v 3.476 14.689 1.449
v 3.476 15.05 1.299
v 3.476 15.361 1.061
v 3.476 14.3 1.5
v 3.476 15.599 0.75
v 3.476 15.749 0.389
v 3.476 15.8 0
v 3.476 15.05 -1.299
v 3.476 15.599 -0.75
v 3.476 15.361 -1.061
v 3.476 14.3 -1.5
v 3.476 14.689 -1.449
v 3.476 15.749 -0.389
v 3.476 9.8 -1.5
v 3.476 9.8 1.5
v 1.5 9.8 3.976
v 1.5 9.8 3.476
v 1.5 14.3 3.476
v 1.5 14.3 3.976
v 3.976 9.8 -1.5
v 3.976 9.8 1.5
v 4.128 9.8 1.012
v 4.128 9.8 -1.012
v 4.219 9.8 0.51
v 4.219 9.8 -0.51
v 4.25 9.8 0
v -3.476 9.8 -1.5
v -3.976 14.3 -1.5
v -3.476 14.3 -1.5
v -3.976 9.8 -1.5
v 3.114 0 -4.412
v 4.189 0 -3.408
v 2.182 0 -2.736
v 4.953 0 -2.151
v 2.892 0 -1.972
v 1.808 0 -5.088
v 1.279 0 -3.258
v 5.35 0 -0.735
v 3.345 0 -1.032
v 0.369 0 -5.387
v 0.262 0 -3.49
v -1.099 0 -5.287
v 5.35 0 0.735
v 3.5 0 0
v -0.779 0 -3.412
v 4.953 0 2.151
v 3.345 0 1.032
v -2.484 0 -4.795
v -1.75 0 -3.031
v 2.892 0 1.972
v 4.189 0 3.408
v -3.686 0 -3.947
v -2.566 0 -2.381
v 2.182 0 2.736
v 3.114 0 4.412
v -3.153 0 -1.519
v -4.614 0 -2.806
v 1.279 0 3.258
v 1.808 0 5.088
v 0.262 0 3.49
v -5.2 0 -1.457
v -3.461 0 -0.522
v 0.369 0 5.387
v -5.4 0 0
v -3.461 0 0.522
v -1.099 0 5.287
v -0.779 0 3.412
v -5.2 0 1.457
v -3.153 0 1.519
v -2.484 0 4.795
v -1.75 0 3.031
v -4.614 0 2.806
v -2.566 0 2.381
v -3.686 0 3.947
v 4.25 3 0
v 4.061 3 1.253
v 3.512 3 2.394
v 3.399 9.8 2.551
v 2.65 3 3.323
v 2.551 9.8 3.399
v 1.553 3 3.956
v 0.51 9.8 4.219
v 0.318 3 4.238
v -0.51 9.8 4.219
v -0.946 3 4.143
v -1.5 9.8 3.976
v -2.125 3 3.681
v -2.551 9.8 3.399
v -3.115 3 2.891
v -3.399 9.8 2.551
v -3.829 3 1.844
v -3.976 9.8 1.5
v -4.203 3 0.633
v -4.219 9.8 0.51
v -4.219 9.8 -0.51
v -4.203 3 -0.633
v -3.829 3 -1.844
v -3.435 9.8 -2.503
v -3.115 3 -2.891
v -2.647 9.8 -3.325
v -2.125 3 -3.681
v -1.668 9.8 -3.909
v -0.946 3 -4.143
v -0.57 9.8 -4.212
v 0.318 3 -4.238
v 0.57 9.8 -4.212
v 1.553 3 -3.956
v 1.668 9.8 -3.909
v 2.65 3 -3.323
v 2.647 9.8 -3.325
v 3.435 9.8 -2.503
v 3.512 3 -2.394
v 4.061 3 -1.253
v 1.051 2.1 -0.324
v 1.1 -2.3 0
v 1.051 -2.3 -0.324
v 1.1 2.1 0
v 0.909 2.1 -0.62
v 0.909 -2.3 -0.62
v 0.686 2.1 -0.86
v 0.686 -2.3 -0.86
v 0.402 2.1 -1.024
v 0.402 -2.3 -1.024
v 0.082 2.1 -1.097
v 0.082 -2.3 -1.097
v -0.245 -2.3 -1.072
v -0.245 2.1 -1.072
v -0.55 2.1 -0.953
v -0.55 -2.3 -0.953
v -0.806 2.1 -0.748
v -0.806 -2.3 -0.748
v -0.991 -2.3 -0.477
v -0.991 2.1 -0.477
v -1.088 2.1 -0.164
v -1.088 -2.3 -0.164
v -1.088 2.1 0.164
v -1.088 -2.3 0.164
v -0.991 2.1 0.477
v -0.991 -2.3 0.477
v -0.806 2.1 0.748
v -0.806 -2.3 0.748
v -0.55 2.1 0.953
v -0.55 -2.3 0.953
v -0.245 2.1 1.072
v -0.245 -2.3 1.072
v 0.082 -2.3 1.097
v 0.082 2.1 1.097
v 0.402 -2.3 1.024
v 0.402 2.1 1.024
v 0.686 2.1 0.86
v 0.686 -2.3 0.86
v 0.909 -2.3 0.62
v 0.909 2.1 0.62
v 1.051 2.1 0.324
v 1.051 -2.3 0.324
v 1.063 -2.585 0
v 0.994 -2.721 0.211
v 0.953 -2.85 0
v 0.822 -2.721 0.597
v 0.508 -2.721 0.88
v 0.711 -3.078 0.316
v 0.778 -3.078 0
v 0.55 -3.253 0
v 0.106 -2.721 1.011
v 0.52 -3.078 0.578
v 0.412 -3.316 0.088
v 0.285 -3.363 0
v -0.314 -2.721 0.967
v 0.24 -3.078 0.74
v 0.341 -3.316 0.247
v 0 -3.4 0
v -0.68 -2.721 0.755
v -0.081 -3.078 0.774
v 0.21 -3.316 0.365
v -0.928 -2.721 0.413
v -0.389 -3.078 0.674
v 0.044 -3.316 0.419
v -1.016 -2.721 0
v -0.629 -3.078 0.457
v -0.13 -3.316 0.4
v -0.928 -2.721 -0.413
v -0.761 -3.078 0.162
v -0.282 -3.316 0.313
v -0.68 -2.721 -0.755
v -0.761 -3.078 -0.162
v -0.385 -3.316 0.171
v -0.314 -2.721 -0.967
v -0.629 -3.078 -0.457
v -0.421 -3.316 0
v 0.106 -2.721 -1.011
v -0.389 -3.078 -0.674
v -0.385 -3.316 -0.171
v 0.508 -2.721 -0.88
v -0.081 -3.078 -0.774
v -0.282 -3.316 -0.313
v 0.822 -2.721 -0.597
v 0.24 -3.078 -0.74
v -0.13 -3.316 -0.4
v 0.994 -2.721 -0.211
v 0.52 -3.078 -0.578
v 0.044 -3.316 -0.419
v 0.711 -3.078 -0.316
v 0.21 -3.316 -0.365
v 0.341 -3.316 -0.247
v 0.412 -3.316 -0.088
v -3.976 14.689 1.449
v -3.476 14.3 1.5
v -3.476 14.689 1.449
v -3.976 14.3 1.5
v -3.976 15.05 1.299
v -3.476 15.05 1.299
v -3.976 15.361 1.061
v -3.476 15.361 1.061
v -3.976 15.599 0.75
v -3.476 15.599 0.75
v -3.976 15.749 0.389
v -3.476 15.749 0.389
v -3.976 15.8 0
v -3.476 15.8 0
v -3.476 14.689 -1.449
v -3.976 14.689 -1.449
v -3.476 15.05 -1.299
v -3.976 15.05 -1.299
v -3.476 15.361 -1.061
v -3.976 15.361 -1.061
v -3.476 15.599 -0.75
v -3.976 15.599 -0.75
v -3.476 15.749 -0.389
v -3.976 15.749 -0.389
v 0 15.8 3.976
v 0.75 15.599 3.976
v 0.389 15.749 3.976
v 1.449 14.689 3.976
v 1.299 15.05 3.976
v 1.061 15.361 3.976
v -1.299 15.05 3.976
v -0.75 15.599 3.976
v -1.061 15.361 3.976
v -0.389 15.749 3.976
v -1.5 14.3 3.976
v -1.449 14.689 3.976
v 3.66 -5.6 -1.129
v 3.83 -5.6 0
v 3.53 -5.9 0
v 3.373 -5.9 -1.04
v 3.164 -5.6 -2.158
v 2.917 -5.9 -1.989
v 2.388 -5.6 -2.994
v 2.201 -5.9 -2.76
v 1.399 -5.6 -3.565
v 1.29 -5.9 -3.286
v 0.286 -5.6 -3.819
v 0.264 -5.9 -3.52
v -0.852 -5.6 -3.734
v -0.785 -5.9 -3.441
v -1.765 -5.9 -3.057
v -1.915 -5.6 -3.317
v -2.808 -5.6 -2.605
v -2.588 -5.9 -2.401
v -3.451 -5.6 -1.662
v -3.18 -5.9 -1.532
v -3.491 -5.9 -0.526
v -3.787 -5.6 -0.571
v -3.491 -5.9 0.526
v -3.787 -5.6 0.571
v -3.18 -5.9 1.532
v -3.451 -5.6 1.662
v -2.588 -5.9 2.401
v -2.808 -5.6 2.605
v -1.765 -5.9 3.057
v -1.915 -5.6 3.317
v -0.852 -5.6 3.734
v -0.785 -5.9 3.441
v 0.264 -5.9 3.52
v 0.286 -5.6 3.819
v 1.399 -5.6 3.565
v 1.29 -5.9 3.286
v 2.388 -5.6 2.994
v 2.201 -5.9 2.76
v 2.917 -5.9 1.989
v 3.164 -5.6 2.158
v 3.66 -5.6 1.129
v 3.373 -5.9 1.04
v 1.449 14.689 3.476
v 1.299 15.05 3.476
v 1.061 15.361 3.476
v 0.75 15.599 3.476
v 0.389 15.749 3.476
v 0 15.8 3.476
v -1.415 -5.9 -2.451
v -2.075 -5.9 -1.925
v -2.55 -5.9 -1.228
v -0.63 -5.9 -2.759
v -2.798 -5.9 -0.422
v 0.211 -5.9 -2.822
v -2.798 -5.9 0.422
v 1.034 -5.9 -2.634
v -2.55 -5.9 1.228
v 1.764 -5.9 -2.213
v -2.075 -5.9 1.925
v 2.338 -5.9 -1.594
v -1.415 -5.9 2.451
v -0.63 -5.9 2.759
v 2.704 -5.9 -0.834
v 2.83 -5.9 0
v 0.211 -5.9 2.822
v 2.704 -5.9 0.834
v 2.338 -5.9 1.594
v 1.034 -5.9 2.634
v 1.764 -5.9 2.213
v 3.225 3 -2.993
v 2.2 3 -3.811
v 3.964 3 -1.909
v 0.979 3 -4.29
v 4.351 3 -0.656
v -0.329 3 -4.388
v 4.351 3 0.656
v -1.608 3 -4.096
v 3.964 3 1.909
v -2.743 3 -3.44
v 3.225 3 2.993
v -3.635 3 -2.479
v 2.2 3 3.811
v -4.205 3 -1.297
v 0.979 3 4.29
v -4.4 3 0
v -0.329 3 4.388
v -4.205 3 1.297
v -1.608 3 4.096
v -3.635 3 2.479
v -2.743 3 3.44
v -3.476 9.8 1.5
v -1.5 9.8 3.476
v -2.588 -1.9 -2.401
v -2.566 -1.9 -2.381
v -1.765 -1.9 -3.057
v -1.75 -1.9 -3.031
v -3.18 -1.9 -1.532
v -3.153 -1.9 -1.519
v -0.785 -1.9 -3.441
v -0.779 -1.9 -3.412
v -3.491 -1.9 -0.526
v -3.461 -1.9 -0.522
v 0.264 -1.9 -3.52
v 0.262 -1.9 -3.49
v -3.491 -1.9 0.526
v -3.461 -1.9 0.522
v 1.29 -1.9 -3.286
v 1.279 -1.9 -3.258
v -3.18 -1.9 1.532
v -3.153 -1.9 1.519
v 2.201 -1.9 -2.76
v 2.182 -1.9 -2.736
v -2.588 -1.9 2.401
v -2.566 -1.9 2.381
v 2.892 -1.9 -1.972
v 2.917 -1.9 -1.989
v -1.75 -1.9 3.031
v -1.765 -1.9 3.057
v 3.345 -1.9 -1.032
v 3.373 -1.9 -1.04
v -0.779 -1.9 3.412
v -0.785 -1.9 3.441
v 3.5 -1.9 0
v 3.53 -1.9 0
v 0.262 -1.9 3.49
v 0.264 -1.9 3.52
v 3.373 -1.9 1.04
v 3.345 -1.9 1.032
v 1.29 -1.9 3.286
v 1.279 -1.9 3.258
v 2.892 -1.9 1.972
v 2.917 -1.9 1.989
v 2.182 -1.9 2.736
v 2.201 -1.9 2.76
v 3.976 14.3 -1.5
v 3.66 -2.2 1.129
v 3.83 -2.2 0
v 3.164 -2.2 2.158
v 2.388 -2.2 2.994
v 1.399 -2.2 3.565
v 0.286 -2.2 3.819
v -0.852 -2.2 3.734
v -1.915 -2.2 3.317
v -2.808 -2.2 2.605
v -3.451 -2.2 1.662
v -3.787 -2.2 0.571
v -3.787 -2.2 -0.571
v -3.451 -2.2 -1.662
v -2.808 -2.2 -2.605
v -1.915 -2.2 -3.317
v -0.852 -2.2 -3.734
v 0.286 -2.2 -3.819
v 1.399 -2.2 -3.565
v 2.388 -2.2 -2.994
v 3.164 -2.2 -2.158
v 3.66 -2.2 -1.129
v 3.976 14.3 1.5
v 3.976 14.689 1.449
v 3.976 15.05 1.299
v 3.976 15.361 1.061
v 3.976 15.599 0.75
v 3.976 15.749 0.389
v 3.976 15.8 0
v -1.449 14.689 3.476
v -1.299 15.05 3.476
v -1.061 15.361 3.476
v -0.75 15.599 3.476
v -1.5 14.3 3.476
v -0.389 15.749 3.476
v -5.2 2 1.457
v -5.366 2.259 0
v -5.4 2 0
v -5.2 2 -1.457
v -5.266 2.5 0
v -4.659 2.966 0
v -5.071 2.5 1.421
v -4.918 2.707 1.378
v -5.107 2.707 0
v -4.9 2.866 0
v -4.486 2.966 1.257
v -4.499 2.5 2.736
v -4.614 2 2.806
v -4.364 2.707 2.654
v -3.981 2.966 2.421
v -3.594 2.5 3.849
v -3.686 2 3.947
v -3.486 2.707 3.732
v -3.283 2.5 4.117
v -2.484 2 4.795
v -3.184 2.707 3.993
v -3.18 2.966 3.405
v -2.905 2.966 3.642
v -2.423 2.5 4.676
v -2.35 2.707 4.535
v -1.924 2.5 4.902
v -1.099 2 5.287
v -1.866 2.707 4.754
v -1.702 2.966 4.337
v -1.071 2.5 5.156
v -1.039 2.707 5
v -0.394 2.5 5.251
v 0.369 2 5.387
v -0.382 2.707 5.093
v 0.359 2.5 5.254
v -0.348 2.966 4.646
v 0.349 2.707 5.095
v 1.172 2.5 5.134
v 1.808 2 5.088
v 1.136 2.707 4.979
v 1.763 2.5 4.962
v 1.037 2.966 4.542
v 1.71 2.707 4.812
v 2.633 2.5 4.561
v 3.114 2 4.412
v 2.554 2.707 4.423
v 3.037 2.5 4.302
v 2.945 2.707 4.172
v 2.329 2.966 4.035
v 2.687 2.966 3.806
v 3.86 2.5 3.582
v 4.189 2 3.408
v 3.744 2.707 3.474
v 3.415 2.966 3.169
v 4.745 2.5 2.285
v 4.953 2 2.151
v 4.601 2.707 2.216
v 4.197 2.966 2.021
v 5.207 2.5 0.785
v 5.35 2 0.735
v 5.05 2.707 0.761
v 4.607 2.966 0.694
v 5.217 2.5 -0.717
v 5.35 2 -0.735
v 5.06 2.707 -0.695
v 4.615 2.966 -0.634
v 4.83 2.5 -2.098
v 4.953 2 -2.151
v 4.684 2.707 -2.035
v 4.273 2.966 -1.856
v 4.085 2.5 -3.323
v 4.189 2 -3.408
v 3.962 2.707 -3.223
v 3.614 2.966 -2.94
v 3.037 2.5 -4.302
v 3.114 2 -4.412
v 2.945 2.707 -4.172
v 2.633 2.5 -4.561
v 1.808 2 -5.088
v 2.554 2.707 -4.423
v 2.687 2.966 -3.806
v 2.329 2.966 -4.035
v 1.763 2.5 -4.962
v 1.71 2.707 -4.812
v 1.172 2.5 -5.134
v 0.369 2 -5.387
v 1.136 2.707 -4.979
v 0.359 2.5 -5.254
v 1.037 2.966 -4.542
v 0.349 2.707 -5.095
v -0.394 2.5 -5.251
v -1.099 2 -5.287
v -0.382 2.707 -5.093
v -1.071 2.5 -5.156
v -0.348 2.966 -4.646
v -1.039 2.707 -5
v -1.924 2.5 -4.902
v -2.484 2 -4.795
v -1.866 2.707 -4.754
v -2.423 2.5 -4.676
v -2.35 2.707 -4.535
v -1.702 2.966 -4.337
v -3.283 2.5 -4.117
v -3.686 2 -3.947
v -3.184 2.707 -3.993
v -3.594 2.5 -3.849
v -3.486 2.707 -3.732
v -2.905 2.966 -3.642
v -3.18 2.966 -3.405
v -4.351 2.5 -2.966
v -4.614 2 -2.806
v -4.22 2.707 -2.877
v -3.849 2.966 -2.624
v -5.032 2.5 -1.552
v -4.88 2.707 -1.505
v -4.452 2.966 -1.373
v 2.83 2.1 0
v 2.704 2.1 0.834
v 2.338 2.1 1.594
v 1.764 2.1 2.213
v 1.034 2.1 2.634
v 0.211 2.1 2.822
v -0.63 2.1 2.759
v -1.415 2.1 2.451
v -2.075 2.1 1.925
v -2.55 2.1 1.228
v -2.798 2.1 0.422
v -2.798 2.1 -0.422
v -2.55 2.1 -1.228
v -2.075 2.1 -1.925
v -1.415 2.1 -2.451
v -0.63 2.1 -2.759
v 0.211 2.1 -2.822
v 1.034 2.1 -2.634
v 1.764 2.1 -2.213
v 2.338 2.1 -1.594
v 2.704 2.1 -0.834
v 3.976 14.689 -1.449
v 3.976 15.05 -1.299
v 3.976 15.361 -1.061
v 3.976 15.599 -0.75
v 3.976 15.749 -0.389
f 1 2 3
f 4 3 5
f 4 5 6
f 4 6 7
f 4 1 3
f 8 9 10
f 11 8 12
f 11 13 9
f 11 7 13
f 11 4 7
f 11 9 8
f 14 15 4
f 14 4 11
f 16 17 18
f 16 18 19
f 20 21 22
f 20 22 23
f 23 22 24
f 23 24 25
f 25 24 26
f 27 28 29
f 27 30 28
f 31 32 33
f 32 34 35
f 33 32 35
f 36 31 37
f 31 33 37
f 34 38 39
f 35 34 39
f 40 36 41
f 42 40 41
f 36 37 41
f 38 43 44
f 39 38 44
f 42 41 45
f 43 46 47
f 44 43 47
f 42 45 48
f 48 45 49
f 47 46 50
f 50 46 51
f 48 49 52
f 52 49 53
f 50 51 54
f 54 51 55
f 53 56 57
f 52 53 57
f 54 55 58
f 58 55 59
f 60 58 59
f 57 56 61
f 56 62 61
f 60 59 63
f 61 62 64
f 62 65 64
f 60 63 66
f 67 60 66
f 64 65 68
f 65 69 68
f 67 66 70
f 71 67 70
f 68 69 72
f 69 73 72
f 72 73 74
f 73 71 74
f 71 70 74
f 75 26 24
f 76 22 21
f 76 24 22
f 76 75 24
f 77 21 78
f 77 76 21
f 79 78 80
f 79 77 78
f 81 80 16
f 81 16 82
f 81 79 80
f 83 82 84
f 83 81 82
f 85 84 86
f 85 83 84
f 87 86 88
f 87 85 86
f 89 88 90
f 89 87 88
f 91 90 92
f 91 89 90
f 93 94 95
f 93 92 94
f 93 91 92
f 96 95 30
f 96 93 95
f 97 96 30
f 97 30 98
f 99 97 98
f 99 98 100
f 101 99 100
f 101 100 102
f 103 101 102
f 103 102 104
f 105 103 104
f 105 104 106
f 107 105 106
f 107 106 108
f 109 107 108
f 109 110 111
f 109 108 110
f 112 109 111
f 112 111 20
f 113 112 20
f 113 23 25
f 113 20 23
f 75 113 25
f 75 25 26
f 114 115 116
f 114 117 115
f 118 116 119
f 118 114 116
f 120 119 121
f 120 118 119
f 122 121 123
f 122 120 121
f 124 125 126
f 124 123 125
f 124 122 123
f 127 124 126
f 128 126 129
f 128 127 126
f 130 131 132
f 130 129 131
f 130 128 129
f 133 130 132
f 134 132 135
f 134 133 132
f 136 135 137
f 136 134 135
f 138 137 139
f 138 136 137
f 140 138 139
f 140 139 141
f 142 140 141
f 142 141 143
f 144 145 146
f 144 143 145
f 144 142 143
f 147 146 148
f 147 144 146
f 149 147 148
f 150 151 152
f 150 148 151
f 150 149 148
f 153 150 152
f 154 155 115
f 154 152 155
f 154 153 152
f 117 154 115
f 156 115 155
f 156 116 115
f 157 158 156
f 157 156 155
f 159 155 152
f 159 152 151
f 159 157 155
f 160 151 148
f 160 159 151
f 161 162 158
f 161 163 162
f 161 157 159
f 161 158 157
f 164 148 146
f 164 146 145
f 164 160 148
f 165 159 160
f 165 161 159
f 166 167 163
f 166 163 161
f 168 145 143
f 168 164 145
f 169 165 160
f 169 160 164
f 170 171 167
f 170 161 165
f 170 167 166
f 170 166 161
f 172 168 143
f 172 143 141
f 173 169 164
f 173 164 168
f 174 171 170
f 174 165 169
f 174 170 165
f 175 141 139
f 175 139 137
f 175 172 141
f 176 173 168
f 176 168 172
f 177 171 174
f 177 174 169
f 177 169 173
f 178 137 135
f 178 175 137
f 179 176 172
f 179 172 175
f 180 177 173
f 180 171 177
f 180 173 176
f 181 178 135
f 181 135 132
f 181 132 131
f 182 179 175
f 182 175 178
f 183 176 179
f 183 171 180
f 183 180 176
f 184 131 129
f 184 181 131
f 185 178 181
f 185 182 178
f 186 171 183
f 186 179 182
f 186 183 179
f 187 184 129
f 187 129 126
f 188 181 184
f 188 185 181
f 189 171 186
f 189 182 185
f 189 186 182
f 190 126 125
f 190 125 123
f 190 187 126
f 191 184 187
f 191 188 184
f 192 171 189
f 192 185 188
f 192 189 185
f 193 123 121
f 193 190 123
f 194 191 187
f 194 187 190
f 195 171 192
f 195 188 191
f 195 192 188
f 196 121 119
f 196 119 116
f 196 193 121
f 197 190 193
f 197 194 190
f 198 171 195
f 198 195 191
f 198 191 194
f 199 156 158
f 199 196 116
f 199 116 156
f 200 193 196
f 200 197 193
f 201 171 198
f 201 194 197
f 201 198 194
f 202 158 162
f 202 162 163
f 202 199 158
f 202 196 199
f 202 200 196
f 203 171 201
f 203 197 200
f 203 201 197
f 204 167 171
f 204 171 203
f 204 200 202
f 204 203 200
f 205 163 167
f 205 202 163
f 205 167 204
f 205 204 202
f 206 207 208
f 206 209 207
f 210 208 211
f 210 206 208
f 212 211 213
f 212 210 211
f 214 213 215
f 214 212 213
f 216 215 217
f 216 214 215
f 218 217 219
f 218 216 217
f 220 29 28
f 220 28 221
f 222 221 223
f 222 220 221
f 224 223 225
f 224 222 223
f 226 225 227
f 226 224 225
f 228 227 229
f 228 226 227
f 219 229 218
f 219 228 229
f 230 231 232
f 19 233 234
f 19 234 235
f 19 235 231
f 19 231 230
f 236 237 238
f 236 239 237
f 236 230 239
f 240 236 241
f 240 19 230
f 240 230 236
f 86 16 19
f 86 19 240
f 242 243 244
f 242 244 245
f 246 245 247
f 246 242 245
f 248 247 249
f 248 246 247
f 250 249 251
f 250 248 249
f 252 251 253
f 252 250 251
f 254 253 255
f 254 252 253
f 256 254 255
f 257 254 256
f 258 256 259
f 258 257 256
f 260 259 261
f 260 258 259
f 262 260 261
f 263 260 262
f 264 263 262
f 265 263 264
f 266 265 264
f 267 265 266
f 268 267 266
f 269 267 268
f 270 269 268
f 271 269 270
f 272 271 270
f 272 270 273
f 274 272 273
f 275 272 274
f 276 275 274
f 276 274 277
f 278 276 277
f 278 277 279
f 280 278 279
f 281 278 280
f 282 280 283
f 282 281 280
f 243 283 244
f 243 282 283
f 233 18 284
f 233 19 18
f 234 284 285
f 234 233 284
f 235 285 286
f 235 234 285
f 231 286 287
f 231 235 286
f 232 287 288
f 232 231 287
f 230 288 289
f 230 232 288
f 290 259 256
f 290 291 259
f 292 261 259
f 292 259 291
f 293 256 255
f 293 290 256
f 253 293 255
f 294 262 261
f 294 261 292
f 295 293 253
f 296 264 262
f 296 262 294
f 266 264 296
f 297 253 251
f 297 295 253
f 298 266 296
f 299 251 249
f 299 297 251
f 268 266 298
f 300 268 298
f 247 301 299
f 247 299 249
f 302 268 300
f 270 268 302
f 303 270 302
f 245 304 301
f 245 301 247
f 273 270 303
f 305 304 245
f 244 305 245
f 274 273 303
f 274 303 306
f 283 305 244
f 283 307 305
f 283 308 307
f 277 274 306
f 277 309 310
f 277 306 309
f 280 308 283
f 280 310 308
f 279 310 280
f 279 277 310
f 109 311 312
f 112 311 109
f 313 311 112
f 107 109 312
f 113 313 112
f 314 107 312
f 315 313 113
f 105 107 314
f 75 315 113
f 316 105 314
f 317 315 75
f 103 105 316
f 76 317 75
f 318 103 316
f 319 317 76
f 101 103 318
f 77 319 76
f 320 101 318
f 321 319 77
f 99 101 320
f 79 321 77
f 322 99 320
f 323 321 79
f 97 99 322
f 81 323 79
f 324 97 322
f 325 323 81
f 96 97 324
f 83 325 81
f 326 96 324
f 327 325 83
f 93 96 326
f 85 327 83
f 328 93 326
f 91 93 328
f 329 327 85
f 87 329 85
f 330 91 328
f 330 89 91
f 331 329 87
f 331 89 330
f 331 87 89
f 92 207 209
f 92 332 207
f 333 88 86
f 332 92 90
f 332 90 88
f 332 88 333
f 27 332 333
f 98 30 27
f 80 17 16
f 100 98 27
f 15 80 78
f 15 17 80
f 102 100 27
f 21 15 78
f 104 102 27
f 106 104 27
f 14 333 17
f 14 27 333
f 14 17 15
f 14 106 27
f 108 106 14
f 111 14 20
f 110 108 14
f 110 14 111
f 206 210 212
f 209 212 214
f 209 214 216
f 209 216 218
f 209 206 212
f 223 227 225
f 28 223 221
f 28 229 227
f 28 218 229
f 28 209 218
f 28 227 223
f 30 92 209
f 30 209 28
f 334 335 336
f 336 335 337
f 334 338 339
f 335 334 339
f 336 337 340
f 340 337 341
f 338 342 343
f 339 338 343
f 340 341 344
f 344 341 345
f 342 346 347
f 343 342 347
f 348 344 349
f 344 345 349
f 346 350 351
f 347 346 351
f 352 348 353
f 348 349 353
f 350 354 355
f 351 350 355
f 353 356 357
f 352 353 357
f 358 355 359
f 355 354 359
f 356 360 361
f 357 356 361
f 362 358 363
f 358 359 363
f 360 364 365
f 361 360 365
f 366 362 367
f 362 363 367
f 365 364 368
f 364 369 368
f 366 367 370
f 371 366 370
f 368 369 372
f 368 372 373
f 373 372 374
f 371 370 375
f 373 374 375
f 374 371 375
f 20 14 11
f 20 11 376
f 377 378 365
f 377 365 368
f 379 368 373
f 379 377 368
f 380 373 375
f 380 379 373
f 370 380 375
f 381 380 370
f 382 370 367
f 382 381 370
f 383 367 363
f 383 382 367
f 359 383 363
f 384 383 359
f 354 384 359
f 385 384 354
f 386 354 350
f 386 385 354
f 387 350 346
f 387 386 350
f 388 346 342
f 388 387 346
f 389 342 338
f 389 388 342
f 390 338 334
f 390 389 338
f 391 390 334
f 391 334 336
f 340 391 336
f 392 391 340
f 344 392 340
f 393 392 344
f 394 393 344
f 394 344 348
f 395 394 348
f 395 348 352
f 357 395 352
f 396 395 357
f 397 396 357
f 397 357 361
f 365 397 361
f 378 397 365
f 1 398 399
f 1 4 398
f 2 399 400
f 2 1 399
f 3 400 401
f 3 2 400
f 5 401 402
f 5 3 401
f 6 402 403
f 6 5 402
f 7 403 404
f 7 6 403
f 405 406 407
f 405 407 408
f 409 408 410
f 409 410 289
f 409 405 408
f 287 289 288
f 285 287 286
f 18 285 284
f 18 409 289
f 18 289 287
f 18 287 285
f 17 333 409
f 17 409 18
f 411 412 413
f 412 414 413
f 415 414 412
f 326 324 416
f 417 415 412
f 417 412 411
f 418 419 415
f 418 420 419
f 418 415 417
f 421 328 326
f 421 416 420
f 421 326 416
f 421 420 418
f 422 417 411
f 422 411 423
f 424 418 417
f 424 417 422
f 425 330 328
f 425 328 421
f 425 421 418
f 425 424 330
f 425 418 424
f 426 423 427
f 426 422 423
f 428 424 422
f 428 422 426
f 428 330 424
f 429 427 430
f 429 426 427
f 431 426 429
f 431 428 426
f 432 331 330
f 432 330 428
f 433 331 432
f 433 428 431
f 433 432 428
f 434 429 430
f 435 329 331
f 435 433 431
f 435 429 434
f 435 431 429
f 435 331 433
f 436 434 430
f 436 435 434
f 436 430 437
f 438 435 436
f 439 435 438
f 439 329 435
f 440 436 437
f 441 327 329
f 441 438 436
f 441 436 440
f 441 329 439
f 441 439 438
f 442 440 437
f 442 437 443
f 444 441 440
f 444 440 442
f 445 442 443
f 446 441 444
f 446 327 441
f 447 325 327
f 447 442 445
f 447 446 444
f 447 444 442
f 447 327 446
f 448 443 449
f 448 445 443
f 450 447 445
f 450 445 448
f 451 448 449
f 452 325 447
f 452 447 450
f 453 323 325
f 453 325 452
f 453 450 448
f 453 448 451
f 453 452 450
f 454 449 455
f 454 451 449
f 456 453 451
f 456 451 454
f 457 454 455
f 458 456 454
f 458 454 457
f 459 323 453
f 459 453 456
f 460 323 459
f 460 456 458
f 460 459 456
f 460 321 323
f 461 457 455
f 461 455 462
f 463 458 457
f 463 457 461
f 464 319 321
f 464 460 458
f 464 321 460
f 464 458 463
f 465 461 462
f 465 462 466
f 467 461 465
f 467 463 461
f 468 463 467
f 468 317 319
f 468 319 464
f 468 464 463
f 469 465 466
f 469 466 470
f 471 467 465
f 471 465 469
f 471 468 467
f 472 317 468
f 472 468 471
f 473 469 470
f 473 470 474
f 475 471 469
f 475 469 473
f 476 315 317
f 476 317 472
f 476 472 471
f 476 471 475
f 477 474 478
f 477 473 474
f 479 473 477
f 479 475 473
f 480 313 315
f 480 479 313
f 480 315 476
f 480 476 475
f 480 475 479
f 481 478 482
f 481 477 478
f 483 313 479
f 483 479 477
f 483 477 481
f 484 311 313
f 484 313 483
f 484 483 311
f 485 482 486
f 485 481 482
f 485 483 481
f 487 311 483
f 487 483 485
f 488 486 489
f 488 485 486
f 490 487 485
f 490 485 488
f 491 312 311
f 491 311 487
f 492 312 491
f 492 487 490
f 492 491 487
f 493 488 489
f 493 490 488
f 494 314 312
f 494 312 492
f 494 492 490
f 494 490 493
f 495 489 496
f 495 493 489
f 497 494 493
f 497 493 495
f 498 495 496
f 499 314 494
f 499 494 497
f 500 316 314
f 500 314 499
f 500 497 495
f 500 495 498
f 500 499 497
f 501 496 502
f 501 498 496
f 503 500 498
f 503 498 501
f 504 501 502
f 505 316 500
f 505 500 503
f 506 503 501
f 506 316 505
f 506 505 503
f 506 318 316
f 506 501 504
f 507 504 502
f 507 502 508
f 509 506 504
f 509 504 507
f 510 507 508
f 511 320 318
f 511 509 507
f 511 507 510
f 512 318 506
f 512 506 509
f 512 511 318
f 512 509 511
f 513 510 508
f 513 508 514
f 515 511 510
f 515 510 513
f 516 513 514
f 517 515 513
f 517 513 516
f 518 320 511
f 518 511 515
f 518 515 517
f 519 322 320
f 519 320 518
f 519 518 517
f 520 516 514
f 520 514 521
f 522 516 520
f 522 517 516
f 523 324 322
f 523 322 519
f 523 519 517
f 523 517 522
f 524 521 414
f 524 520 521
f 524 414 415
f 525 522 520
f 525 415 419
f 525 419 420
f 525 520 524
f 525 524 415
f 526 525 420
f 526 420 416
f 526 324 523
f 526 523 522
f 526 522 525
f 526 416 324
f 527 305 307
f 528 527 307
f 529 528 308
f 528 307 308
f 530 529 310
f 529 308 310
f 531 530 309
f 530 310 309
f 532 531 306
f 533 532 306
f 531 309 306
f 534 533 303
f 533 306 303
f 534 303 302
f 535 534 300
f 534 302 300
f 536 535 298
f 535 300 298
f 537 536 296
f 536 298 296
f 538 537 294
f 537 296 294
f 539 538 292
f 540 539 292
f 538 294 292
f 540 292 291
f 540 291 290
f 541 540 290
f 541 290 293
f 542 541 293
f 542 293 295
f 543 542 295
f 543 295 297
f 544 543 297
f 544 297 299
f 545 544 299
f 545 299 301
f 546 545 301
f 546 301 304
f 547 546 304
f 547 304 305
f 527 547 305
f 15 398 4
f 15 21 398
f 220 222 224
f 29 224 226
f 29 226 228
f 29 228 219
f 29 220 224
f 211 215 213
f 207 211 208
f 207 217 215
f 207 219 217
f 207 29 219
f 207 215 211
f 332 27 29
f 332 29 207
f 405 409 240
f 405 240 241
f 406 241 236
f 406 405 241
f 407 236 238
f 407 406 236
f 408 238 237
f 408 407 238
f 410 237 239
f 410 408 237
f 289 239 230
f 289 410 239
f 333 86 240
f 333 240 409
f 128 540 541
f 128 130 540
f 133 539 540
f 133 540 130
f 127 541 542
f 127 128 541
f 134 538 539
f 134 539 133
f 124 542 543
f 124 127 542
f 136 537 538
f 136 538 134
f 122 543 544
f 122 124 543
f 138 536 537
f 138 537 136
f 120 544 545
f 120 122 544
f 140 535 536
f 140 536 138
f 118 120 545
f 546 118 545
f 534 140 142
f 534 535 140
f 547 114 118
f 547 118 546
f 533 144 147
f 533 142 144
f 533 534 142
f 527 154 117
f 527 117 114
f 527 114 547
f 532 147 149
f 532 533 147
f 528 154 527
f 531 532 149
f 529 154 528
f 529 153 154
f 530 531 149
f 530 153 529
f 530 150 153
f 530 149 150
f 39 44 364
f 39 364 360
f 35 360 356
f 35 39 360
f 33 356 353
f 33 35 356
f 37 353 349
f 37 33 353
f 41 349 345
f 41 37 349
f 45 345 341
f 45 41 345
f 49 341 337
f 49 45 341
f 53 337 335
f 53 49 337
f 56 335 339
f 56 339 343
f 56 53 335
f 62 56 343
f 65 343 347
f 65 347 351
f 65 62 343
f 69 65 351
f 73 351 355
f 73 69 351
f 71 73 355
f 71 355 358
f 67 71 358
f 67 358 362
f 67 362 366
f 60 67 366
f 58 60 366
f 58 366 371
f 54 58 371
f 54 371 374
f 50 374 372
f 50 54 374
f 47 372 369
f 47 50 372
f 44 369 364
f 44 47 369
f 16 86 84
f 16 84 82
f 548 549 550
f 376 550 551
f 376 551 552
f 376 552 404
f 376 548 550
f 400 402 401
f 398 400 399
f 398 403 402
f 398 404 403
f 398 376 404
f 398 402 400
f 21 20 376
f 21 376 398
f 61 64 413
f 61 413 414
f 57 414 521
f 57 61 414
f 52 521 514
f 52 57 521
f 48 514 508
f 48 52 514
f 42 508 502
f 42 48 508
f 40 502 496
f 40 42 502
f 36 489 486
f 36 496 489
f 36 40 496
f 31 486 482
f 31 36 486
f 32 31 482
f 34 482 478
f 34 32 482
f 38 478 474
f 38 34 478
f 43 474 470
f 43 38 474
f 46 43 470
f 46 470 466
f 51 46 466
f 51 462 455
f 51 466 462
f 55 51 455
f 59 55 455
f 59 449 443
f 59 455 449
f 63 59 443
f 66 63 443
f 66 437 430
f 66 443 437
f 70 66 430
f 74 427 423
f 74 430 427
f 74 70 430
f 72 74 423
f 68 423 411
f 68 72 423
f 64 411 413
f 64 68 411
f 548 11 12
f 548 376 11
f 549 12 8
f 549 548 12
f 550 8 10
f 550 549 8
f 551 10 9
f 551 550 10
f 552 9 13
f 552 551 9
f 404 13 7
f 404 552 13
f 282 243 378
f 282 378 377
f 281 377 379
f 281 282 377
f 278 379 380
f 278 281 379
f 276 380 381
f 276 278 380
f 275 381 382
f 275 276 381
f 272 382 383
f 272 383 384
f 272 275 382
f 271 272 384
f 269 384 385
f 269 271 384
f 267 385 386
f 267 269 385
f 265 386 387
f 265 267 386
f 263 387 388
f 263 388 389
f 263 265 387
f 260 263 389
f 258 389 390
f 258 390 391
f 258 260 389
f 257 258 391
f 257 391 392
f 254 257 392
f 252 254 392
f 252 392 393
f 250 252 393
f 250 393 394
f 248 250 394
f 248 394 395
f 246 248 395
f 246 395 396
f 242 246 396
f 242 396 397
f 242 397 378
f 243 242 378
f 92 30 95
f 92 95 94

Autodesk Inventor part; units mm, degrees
ref_plane "YZ Plane" through (0, 0, 0) normal (1, 0, 0) x (0, 1, 0)
ref_plane "XZ Plane" through (0, 0, 0) normal (0, 1, 0) x (-1, 0, 0)
ref_plane "XY Plane" through (0, 0, 0) normal (0, 0, 1) x (1, 0, 0)
sketch "Sketch1" plane through (0, 0, 0) normal (0, 1, 0) x (-1, 0, 0)
  circle A0 centre (0, 0) radius 5.4
  dimension "d0" = 10.8
extrude "Extrusion1" add sketch "Sketch1" along normal blind 3
fillet "Fillet1" radius 1 1 edges at (5.4, 3, 0)
sketch "Sketch2" plane through (0, 3, 0) normal (0, 1, 0) x (1, 0, 0)
  circle A0 centre (0, 0) radius 4.25
  dimension "d4" = 8.5
extrude "Extrusion2" add sketch "Sketch2" along normal blind 6.8
sketch "Sketch3" plane through (0, 0, 0) normal (0, -1, 0) x (1, 0, 0)
  circle A0 centre (0, 0) radius 3.5
  dimension "d7" = 7
extrude "Extrusion3" add sketch "Sketch3" along normal blind 5.9
sketch "Sketch4" plane through (0, -5.9, 0) normal (0, -1, 0) x (1, 0, 0)
  circle A0 centre (0, 0) radius 4.25 projected
  circle A1 centre (0, 0) radius 3.83
  dimension "d10" = 7.66
extrude "Extrusion4" add sketch "Sketch4" against normal blind 4 contours A1
sketch "Sketch5" plane through (0, 9.8, 0) normal (0, 1, 0) x (1, 0, 0)
  line L0 (-3.9765, 1.5) -> (-3.4765, 1.5)
  line L1 (-3.4765, 1.5) -> (-3.4765, -1.5)
  line L2 (-3.4765, -1.5) -> (-3.9765, -1.5)
  line L3 (-3.9765, -1.5) -> (-3.9765, 1.5)
  circle A0 centre (0, 0) radius 4.25 projected
  line L4 (-1.5, -3.9765) -> (-1.5, -3.4765)
  line L5 (-1.5, -3.4765) -> (1.5, -3.4765)
  line L6 (1.5, -3.4765) -> (1.5, -3.9765)
  line L7 (1.5, -3.9765) -> (-1.5, -3.9765)
  line L8 (3.9765, -1.5) -> (3.4765, -1.5)
  line L9 (3.4765, -1.5) -> (3.4765, 1.5)
  line L10 (3.4765, 1.5) -> (3.9765, 1.5)
  line L11 (3.9765, 1.5) -> (3.9765, -1.5)
  dimension "d13" = 0.5
  dimension "d14" = 3
  dimension "d17" = 180
extrude "Extrusion5" add sketch "Sketch5" along normal blind 6 contours L0 L1 L2 L3 | L11 L8 L9 L10 | L4 L5 L6 L7
fillet "Fillet2" radius 1.5 6 edges at (3.7265, 15.8, -1.5) (3.7265, 15.8, 1.5) (1.5, 15.8, 3.7265) (-1.5, 15.8, 3.7265) (-3.7265, 15.8, 1.5) (-3.7265, 15.8, -1.5)
chamfer "Chamfer1" distance 0.3 angle 45 1 edges at (-3.83, -1.9, 0)
chamfer "Chamfer2" distance 0.3 angle 45 1 edges at (-3.83, -5.9, 0)
sketch "Sketch6" plane through (0, -5.9, 0) normal (0, -1, 0) x (1, 0, 0)
  circle A0 centre (0, 0) radius 3.83 projected
  circle A1 centre (0, 0) radius 2.83
  dimension "d28" = 1
extrude "Extrusion6" cut sketch "Sketch6" against normal blind 8 contours A1
sketch "Sketch7" plane through (0, 2.1, 0) normal (0, -1, 0) x (1, 0, 0)
  circle A0 centre (0, 0) radius 1.1
  dimension "d31" = 2.2
extrude "Extrusion7" add sketch "Sketch7" along normal blind 5.5
fillet "Fillet3" radius 1.1 1 edges at (-1.1, -3.4, 0)
equation "\"d34\" = 0.5 * d31"
properties part number "gniazdo_zasilania"
